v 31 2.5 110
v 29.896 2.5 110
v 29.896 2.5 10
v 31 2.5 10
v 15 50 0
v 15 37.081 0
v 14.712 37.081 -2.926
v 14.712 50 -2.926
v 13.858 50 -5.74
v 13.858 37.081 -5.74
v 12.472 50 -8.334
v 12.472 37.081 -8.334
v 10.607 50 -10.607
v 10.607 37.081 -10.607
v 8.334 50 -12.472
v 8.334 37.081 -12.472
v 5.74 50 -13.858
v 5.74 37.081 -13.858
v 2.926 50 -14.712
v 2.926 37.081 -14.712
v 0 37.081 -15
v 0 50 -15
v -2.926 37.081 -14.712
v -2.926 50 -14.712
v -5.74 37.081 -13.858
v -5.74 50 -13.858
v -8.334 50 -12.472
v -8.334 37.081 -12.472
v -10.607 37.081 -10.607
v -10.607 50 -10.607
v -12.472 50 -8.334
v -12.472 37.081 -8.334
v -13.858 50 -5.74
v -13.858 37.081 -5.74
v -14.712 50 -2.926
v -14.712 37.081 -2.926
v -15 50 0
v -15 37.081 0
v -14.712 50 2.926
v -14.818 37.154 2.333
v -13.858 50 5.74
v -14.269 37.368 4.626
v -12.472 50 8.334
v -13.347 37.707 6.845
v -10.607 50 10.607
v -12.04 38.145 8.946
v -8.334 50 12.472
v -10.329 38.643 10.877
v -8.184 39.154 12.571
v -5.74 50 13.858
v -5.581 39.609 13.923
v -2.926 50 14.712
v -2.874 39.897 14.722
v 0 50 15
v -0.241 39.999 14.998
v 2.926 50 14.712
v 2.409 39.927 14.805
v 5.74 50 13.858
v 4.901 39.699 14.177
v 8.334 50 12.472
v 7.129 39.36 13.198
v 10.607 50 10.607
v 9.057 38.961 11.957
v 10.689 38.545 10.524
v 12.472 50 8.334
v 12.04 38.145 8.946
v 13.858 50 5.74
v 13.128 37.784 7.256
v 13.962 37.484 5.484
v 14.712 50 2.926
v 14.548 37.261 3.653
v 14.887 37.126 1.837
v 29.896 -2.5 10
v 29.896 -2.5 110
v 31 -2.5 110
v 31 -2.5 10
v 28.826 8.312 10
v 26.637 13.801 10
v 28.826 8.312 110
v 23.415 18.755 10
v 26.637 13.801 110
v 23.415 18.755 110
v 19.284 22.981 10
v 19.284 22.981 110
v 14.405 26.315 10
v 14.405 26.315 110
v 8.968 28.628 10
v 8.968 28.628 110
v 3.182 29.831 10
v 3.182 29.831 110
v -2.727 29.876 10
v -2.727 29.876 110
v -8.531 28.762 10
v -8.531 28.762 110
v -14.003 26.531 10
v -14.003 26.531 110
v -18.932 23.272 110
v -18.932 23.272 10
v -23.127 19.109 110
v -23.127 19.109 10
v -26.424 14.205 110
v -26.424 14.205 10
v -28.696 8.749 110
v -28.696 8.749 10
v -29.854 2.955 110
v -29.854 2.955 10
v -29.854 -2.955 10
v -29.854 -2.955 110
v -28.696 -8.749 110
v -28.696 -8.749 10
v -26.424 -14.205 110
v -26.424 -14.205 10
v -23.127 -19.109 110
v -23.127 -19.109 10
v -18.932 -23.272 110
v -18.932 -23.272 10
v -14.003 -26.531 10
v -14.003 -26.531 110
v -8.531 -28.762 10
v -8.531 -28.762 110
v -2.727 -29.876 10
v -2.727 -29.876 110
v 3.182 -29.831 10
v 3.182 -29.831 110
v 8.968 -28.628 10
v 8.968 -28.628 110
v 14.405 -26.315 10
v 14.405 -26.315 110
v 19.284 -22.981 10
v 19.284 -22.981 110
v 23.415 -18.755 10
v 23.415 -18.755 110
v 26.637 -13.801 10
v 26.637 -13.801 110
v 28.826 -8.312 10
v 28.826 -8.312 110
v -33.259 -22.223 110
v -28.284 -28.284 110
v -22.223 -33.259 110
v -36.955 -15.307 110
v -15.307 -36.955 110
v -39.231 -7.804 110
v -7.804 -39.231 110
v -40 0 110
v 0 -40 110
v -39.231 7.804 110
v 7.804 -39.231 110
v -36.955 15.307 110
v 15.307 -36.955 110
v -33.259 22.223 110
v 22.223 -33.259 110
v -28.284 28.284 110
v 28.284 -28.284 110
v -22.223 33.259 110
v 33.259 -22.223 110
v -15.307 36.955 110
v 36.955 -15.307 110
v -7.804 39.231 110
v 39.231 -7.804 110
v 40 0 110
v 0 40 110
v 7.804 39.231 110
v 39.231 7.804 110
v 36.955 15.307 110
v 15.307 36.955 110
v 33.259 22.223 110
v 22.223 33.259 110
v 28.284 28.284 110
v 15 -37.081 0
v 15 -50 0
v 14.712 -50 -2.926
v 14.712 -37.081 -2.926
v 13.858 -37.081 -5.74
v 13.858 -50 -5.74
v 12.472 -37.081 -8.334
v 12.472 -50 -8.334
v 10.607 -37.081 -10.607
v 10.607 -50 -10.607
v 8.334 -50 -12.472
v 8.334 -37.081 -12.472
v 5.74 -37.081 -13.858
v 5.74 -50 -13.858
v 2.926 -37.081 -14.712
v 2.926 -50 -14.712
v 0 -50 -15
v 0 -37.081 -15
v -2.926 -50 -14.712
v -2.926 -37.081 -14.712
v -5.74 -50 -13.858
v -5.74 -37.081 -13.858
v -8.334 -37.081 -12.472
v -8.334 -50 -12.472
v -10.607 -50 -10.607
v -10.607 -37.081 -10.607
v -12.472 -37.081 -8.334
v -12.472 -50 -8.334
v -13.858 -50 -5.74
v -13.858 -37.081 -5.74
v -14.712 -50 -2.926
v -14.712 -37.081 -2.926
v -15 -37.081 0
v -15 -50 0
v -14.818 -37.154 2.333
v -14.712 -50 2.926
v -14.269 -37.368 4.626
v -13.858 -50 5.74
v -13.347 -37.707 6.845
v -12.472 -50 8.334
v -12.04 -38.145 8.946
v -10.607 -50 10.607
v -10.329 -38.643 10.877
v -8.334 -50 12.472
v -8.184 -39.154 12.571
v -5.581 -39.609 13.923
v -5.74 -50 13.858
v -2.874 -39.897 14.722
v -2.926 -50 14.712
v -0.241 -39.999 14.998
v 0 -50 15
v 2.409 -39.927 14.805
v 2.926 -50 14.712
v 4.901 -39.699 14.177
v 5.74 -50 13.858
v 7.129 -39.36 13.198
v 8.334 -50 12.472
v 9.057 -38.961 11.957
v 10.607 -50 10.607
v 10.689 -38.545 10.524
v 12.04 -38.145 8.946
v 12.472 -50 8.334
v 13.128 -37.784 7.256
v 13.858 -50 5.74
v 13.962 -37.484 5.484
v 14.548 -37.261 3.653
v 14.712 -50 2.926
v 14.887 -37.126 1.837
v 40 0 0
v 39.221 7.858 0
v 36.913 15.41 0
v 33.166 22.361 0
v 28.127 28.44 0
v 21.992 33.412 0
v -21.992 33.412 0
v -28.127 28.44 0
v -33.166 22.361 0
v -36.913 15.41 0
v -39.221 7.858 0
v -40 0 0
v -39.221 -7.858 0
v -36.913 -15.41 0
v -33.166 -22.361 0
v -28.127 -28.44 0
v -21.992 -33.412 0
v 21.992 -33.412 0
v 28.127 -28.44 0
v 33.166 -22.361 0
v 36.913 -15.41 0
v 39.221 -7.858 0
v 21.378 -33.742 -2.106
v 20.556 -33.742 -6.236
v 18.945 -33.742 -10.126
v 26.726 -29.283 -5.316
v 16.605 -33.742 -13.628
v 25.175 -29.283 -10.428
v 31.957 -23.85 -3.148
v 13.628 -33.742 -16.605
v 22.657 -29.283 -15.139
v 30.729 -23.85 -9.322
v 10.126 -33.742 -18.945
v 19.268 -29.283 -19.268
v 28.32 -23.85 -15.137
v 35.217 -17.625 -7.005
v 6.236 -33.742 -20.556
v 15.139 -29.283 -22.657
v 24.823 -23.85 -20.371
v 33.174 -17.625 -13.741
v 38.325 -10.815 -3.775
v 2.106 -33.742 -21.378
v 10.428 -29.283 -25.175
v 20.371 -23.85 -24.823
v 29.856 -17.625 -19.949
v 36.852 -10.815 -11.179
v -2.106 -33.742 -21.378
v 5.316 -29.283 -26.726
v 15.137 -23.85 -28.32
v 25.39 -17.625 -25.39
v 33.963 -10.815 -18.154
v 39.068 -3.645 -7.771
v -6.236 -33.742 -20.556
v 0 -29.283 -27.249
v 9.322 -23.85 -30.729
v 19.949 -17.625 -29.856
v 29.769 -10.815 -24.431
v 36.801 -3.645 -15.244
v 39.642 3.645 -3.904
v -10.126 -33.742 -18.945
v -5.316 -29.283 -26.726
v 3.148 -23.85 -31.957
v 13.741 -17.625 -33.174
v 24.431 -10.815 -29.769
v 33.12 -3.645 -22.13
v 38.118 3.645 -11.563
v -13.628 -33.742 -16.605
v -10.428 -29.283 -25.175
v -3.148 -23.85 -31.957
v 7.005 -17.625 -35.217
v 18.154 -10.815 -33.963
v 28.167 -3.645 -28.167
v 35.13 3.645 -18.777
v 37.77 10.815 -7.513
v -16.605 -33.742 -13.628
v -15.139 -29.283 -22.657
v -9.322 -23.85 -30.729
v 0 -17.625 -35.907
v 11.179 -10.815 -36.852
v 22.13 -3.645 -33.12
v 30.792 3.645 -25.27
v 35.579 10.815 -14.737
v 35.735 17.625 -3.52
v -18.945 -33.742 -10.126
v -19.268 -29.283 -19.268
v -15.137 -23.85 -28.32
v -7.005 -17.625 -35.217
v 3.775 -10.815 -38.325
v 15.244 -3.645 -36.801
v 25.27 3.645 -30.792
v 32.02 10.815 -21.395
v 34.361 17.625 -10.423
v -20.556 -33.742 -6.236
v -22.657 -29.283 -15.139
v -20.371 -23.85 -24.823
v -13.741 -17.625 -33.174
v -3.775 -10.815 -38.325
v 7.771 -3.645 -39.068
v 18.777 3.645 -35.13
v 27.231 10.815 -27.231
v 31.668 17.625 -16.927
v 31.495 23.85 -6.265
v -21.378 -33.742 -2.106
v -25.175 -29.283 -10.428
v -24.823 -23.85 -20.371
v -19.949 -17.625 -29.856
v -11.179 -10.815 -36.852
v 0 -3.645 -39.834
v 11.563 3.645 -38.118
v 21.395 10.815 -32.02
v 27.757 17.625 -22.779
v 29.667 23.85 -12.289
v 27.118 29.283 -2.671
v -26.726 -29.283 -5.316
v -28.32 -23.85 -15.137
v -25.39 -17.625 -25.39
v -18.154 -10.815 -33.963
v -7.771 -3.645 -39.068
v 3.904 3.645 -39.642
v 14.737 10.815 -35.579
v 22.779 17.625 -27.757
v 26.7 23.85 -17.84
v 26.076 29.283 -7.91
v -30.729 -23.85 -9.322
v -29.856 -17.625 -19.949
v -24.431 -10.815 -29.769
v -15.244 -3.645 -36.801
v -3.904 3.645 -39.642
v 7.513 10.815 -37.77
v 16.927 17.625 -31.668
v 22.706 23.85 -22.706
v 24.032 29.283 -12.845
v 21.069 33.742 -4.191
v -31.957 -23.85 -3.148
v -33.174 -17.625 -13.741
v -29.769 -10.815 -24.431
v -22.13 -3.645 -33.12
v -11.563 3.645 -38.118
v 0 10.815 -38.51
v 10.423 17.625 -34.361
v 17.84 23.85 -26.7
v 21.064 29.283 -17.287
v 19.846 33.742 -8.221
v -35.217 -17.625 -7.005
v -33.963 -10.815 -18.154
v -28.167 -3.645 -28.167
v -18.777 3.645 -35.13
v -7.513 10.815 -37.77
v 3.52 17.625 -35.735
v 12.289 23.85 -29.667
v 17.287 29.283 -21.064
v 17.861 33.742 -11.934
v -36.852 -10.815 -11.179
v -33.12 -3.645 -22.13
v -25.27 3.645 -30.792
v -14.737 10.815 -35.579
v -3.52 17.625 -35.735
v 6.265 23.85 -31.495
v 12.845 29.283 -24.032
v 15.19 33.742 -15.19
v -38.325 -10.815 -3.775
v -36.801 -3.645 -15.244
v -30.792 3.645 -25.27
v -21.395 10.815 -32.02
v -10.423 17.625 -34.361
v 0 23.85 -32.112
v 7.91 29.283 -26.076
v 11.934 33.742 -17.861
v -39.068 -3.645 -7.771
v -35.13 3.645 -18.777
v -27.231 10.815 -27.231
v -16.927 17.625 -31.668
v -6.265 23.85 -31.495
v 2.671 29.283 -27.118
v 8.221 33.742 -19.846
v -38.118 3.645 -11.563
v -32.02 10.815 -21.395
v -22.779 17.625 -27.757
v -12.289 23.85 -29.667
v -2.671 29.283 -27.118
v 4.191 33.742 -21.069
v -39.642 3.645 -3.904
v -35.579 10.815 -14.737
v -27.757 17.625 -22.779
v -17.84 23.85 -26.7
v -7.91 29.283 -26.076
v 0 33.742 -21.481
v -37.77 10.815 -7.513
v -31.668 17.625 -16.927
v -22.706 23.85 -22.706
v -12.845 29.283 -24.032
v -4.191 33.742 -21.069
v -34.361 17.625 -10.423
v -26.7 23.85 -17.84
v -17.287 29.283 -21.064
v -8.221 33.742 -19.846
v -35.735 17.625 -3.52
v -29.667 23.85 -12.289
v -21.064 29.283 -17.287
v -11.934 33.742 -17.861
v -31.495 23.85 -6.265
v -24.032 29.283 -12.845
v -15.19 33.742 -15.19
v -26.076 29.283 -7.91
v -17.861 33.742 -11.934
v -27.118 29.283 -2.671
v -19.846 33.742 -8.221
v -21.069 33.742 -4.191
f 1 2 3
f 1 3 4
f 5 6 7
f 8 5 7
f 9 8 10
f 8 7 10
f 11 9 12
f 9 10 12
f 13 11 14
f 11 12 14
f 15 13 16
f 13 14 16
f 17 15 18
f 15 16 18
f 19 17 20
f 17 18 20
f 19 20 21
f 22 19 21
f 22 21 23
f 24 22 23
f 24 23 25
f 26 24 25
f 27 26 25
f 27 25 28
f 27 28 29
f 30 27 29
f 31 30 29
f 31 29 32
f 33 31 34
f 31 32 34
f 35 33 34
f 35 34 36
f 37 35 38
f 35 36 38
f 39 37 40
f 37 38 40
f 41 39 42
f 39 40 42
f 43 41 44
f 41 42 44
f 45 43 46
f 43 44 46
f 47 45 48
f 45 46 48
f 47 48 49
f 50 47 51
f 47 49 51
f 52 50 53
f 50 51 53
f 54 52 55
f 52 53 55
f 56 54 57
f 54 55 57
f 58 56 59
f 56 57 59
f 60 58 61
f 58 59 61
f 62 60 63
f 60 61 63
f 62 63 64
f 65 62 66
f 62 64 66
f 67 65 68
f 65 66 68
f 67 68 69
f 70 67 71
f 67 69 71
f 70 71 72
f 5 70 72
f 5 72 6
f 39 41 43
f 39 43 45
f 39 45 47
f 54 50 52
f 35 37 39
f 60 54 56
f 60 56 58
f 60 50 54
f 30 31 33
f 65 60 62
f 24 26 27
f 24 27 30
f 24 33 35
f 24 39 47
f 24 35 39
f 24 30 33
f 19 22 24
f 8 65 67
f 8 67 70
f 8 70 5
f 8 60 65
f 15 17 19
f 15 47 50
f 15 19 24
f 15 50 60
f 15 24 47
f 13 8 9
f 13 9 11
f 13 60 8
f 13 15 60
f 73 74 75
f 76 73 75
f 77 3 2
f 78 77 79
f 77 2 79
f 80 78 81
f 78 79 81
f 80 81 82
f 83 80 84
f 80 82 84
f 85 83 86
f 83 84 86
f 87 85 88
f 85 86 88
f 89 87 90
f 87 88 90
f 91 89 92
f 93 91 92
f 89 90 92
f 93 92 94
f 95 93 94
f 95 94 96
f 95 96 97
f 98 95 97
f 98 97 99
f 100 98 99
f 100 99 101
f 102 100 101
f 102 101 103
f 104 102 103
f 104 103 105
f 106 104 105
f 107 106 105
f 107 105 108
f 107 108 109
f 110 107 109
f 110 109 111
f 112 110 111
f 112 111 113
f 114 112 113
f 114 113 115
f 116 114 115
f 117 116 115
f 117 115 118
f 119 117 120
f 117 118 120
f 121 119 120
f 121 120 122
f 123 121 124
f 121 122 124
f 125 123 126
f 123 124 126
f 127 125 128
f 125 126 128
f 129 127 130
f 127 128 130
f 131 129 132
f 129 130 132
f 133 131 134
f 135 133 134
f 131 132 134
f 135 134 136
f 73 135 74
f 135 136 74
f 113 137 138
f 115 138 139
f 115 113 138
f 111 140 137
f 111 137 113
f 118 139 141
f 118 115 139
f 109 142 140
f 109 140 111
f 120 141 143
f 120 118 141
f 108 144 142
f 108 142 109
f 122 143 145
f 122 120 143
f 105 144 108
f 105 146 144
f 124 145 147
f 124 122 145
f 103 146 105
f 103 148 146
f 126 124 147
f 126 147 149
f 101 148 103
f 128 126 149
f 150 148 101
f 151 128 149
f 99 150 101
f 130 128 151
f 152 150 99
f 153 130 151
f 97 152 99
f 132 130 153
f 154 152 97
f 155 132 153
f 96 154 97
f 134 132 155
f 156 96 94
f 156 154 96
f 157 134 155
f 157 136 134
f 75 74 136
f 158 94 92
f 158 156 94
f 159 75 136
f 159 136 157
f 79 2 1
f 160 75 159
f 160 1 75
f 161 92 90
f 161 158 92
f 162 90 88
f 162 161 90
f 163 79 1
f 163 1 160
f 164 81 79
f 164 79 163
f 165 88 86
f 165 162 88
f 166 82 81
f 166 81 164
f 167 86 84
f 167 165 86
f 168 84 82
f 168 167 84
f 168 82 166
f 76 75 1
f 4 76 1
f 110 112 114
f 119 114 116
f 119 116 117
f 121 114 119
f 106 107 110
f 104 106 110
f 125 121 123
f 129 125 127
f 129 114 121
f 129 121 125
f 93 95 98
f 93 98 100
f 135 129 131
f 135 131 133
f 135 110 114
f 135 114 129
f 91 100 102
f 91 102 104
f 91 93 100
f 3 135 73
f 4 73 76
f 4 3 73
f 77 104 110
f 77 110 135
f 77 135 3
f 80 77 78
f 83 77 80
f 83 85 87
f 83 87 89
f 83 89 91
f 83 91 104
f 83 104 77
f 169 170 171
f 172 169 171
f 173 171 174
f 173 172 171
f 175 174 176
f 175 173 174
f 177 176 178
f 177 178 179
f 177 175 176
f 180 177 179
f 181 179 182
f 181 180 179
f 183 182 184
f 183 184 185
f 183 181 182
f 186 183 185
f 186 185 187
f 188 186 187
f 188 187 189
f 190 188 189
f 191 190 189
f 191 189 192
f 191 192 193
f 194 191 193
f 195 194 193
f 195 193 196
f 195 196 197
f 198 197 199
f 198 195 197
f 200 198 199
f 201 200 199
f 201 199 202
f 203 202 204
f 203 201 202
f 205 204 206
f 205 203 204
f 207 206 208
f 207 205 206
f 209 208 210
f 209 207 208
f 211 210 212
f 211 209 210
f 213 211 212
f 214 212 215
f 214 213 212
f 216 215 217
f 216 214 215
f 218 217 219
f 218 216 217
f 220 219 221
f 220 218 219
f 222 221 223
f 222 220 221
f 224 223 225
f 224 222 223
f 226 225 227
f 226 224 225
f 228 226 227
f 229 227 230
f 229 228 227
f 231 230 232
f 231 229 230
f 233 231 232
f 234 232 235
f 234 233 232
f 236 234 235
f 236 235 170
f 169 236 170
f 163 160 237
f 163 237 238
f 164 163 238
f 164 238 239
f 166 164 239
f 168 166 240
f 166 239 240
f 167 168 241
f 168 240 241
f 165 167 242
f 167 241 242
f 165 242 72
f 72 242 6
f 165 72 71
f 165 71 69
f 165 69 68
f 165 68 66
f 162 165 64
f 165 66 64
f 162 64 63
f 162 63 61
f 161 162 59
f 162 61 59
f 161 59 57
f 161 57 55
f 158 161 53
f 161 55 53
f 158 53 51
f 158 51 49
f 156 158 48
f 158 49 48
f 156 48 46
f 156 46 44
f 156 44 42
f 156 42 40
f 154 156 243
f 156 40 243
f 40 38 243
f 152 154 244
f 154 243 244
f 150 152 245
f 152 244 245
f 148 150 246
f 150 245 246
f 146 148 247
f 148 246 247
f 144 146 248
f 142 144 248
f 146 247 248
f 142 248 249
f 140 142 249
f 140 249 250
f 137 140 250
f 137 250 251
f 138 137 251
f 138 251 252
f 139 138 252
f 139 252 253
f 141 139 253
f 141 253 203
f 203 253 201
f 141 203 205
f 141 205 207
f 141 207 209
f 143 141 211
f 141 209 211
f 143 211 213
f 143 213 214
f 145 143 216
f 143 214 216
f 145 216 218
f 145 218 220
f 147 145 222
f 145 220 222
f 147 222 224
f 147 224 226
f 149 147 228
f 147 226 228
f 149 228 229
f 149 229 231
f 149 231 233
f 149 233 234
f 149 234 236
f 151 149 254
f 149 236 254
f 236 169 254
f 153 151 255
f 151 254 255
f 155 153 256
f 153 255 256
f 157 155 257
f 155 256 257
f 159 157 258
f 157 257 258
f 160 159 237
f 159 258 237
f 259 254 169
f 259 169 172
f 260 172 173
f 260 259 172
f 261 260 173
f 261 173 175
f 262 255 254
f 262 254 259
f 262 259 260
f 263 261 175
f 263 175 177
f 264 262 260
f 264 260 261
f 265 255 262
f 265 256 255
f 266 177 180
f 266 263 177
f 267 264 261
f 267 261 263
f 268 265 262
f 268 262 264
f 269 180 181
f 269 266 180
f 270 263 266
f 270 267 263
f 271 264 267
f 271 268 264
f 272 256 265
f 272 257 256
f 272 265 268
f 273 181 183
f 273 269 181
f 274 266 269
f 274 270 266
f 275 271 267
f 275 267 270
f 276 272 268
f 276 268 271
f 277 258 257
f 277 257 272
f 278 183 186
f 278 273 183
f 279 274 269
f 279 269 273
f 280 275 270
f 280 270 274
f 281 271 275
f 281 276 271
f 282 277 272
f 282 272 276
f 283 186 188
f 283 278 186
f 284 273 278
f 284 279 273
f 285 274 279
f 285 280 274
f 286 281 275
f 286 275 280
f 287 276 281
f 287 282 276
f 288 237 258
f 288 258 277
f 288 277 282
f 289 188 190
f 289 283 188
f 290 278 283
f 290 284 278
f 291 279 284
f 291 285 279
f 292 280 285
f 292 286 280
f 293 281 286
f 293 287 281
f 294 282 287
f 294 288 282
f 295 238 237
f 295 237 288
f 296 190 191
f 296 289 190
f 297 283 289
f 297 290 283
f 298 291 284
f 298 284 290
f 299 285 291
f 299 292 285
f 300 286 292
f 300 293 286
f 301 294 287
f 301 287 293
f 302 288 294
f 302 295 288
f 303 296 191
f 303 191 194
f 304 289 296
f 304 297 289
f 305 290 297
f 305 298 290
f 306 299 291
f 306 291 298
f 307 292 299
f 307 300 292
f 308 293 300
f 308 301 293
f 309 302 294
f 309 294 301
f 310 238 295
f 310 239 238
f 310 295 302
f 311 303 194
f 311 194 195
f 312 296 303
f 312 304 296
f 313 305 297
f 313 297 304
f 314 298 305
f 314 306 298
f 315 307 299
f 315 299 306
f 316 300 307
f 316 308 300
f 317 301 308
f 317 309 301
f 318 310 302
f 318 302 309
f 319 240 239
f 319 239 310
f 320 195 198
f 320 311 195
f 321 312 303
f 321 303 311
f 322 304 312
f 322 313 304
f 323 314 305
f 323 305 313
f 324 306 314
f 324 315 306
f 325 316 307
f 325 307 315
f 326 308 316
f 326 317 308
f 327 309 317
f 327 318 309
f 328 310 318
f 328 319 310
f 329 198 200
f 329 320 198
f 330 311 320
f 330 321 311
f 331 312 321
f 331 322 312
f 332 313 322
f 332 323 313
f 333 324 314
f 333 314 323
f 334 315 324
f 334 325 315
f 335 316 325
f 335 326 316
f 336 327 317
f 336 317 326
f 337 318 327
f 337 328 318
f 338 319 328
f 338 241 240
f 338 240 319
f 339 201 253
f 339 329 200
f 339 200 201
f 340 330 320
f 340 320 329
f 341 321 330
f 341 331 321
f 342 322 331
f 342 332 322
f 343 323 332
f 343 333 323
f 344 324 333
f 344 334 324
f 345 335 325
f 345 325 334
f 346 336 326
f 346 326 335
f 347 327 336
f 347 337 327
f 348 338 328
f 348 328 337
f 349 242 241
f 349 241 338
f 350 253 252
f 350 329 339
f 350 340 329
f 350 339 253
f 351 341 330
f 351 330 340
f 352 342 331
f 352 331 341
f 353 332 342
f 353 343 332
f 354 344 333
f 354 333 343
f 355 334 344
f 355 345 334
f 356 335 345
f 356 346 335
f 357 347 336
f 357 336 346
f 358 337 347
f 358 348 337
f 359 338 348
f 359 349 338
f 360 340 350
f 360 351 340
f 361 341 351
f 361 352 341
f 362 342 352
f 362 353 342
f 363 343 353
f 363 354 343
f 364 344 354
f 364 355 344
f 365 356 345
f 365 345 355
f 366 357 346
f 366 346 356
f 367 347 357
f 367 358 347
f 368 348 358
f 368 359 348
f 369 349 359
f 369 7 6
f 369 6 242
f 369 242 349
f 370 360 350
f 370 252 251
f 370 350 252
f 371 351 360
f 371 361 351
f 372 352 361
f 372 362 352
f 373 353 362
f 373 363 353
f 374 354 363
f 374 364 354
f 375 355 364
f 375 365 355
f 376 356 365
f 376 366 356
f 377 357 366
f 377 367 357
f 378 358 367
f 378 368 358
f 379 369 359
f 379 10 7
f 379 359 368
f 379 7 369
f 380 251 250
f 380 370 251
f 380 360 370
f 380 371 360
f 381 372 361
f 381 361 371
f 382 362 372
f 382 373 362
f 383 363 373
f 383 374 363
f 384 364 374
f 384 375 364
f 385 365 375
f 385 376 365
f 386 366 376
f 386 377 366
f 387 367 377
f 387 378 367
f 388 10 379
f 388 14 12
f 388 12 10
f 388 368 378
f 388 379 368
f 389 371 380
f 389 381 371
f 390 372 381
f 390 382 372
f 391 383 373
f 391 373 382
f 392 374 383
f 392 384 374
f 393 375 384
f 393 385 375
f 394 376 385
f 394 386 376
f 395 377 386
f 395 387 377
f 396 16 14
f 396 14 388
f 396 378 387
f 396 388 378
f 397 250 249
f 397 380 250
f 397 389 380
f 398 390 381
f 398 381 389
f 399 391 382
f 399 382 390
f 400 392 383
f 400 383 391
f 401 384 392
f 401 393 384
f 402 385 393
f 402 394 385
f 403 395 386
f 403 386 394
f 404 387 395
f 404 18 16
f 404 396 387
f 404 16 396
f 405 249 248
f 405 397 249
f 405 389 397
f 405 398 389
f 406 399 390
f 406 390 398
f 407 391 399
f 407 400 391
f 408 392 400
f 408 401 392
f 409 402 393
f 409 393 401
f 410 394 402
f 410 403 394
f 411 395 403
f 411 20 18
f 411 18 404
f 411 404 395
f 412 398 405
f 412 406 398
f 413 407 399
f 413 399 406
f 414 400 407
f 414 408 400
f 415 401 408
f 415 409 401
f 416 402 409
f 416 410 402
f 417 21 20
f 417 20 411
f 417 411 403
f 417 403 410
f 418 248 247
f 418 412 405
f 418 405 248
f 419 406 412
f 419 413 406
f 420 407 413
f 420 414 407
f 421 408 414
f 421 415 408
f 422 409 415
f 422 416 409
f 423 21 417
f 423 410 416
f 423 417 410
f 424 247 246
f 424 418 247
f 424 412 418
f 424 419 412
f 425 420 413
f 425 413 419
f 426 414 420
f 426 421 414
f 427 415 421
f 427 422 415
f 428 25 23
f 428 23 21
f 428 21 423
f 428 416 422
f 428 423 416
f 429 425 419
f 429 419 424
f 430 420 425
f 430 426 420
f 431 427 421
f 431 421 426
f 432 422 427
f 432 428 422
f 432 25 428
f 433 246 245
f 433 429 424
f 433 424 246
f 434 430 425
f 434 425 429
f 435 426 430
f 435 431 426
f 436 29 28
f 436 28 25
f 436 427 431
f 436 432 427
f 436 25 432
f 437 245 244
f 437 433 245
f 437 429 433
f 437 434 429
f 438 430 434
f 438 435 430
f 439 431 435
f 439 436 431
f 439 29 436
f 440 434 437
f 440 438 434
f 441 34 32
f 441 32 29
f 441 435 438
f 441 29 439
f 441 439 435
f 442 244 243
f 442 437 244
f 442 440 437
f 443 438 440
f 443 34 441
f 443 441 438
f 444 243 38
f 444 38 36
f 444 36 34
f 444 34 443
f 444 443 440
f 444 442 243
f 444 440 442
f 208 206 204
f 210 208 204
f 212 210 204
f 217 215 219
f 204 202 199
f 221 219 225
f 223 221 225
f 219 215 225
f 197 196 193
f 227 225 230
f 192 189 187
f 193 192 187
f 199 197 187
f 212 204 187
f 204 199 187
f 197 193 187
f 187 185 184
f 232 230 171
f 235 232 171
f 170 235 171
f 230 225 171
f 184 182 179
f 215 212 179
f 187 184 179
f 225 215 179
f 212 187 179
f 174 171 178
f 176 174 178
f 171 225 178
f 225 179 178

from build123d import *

# Parameters (mm, degrees)
SKETCH1_R           = 40
BOSS_EXTRUDE2_DEPTH = 110
SKETCH4_R           = 15
BOSS_EXTRUDE3_DEPTH = 50
SKETCH5_R           = 15
BOSS_EXTRUDE4_DEPTH = 50
SKETCH6_R           = 30
CUT_EXTRUDE1_DEPTH  = 100
SKETCH8_W           = 31
SKETCH8_H           = 5
CUT_EXTRUDE2_DEPTH  = 100


with BuildPart() as part:
    # Sketch1 → Boss-Extrude2 (new body)
    with BuildSketch(Plane.XY):
        Circle(SKETCH1_R)
    extrude(amount=BOSS_EXTRUDE2_DEPTH)

    # Sketch3 → Revolve1 (revolve)
    with BuildSketch(Plane(origin=(0, 0, 0), x_dir=(0, 0, -1), z_dir=(1, 0, 0))):
        with BuildLine():
            Line((0, 40), (0, -40))
            ThreePointArc((0, -40), (40, 0), (0, 40))
        make_face()
    revolve(axis=Axis((0, -40, 0), (0, 1, 0)))

    # Sketch4 → Boss-Extrude3 (add)
    with BuildSketch(Plane(origin=(0, 0, 0), x_dir=(1, 0, 0), z_dir=(0, 1, 0))):
        Circle(SKETCH4_R)
    extrude(amount=BOSS_EXTRUDE3_DEPTH)

    # Sketch5 → Boss-Extrude4 (add)
    with BuildSketch(Plane(origin=(0, 0, 0), x_dir=(1, 0, 0), z_dir=(0, 1, 0))):
        Circle(SKETCH5_R)
    extrude(amount=-BOSS_EXTRUDE4_DEPTH)

    # Sketch6 → Cut-Extrude1 (cut)
    with BuildSketch(Plane.XY.offset(110)):
        Circle(SKETCH6_R)
    extrude(amount=-CUT_EXTRUDE1_DEPTH, mode=Mode.SUBTRACT)

    # Sketch8 → Cut-Extrude2 (cut)
    with BuildSketch(Plane.XY.offset(110)):
        with Locations((15.5, 0)):
            Rectangle(SKETCH8_W, SKETCH8_H)
    extrude(amount=-CUT_EXTRUDE2_DEPTH, mode=Mode.SUBTRACT)


solid = part.part
